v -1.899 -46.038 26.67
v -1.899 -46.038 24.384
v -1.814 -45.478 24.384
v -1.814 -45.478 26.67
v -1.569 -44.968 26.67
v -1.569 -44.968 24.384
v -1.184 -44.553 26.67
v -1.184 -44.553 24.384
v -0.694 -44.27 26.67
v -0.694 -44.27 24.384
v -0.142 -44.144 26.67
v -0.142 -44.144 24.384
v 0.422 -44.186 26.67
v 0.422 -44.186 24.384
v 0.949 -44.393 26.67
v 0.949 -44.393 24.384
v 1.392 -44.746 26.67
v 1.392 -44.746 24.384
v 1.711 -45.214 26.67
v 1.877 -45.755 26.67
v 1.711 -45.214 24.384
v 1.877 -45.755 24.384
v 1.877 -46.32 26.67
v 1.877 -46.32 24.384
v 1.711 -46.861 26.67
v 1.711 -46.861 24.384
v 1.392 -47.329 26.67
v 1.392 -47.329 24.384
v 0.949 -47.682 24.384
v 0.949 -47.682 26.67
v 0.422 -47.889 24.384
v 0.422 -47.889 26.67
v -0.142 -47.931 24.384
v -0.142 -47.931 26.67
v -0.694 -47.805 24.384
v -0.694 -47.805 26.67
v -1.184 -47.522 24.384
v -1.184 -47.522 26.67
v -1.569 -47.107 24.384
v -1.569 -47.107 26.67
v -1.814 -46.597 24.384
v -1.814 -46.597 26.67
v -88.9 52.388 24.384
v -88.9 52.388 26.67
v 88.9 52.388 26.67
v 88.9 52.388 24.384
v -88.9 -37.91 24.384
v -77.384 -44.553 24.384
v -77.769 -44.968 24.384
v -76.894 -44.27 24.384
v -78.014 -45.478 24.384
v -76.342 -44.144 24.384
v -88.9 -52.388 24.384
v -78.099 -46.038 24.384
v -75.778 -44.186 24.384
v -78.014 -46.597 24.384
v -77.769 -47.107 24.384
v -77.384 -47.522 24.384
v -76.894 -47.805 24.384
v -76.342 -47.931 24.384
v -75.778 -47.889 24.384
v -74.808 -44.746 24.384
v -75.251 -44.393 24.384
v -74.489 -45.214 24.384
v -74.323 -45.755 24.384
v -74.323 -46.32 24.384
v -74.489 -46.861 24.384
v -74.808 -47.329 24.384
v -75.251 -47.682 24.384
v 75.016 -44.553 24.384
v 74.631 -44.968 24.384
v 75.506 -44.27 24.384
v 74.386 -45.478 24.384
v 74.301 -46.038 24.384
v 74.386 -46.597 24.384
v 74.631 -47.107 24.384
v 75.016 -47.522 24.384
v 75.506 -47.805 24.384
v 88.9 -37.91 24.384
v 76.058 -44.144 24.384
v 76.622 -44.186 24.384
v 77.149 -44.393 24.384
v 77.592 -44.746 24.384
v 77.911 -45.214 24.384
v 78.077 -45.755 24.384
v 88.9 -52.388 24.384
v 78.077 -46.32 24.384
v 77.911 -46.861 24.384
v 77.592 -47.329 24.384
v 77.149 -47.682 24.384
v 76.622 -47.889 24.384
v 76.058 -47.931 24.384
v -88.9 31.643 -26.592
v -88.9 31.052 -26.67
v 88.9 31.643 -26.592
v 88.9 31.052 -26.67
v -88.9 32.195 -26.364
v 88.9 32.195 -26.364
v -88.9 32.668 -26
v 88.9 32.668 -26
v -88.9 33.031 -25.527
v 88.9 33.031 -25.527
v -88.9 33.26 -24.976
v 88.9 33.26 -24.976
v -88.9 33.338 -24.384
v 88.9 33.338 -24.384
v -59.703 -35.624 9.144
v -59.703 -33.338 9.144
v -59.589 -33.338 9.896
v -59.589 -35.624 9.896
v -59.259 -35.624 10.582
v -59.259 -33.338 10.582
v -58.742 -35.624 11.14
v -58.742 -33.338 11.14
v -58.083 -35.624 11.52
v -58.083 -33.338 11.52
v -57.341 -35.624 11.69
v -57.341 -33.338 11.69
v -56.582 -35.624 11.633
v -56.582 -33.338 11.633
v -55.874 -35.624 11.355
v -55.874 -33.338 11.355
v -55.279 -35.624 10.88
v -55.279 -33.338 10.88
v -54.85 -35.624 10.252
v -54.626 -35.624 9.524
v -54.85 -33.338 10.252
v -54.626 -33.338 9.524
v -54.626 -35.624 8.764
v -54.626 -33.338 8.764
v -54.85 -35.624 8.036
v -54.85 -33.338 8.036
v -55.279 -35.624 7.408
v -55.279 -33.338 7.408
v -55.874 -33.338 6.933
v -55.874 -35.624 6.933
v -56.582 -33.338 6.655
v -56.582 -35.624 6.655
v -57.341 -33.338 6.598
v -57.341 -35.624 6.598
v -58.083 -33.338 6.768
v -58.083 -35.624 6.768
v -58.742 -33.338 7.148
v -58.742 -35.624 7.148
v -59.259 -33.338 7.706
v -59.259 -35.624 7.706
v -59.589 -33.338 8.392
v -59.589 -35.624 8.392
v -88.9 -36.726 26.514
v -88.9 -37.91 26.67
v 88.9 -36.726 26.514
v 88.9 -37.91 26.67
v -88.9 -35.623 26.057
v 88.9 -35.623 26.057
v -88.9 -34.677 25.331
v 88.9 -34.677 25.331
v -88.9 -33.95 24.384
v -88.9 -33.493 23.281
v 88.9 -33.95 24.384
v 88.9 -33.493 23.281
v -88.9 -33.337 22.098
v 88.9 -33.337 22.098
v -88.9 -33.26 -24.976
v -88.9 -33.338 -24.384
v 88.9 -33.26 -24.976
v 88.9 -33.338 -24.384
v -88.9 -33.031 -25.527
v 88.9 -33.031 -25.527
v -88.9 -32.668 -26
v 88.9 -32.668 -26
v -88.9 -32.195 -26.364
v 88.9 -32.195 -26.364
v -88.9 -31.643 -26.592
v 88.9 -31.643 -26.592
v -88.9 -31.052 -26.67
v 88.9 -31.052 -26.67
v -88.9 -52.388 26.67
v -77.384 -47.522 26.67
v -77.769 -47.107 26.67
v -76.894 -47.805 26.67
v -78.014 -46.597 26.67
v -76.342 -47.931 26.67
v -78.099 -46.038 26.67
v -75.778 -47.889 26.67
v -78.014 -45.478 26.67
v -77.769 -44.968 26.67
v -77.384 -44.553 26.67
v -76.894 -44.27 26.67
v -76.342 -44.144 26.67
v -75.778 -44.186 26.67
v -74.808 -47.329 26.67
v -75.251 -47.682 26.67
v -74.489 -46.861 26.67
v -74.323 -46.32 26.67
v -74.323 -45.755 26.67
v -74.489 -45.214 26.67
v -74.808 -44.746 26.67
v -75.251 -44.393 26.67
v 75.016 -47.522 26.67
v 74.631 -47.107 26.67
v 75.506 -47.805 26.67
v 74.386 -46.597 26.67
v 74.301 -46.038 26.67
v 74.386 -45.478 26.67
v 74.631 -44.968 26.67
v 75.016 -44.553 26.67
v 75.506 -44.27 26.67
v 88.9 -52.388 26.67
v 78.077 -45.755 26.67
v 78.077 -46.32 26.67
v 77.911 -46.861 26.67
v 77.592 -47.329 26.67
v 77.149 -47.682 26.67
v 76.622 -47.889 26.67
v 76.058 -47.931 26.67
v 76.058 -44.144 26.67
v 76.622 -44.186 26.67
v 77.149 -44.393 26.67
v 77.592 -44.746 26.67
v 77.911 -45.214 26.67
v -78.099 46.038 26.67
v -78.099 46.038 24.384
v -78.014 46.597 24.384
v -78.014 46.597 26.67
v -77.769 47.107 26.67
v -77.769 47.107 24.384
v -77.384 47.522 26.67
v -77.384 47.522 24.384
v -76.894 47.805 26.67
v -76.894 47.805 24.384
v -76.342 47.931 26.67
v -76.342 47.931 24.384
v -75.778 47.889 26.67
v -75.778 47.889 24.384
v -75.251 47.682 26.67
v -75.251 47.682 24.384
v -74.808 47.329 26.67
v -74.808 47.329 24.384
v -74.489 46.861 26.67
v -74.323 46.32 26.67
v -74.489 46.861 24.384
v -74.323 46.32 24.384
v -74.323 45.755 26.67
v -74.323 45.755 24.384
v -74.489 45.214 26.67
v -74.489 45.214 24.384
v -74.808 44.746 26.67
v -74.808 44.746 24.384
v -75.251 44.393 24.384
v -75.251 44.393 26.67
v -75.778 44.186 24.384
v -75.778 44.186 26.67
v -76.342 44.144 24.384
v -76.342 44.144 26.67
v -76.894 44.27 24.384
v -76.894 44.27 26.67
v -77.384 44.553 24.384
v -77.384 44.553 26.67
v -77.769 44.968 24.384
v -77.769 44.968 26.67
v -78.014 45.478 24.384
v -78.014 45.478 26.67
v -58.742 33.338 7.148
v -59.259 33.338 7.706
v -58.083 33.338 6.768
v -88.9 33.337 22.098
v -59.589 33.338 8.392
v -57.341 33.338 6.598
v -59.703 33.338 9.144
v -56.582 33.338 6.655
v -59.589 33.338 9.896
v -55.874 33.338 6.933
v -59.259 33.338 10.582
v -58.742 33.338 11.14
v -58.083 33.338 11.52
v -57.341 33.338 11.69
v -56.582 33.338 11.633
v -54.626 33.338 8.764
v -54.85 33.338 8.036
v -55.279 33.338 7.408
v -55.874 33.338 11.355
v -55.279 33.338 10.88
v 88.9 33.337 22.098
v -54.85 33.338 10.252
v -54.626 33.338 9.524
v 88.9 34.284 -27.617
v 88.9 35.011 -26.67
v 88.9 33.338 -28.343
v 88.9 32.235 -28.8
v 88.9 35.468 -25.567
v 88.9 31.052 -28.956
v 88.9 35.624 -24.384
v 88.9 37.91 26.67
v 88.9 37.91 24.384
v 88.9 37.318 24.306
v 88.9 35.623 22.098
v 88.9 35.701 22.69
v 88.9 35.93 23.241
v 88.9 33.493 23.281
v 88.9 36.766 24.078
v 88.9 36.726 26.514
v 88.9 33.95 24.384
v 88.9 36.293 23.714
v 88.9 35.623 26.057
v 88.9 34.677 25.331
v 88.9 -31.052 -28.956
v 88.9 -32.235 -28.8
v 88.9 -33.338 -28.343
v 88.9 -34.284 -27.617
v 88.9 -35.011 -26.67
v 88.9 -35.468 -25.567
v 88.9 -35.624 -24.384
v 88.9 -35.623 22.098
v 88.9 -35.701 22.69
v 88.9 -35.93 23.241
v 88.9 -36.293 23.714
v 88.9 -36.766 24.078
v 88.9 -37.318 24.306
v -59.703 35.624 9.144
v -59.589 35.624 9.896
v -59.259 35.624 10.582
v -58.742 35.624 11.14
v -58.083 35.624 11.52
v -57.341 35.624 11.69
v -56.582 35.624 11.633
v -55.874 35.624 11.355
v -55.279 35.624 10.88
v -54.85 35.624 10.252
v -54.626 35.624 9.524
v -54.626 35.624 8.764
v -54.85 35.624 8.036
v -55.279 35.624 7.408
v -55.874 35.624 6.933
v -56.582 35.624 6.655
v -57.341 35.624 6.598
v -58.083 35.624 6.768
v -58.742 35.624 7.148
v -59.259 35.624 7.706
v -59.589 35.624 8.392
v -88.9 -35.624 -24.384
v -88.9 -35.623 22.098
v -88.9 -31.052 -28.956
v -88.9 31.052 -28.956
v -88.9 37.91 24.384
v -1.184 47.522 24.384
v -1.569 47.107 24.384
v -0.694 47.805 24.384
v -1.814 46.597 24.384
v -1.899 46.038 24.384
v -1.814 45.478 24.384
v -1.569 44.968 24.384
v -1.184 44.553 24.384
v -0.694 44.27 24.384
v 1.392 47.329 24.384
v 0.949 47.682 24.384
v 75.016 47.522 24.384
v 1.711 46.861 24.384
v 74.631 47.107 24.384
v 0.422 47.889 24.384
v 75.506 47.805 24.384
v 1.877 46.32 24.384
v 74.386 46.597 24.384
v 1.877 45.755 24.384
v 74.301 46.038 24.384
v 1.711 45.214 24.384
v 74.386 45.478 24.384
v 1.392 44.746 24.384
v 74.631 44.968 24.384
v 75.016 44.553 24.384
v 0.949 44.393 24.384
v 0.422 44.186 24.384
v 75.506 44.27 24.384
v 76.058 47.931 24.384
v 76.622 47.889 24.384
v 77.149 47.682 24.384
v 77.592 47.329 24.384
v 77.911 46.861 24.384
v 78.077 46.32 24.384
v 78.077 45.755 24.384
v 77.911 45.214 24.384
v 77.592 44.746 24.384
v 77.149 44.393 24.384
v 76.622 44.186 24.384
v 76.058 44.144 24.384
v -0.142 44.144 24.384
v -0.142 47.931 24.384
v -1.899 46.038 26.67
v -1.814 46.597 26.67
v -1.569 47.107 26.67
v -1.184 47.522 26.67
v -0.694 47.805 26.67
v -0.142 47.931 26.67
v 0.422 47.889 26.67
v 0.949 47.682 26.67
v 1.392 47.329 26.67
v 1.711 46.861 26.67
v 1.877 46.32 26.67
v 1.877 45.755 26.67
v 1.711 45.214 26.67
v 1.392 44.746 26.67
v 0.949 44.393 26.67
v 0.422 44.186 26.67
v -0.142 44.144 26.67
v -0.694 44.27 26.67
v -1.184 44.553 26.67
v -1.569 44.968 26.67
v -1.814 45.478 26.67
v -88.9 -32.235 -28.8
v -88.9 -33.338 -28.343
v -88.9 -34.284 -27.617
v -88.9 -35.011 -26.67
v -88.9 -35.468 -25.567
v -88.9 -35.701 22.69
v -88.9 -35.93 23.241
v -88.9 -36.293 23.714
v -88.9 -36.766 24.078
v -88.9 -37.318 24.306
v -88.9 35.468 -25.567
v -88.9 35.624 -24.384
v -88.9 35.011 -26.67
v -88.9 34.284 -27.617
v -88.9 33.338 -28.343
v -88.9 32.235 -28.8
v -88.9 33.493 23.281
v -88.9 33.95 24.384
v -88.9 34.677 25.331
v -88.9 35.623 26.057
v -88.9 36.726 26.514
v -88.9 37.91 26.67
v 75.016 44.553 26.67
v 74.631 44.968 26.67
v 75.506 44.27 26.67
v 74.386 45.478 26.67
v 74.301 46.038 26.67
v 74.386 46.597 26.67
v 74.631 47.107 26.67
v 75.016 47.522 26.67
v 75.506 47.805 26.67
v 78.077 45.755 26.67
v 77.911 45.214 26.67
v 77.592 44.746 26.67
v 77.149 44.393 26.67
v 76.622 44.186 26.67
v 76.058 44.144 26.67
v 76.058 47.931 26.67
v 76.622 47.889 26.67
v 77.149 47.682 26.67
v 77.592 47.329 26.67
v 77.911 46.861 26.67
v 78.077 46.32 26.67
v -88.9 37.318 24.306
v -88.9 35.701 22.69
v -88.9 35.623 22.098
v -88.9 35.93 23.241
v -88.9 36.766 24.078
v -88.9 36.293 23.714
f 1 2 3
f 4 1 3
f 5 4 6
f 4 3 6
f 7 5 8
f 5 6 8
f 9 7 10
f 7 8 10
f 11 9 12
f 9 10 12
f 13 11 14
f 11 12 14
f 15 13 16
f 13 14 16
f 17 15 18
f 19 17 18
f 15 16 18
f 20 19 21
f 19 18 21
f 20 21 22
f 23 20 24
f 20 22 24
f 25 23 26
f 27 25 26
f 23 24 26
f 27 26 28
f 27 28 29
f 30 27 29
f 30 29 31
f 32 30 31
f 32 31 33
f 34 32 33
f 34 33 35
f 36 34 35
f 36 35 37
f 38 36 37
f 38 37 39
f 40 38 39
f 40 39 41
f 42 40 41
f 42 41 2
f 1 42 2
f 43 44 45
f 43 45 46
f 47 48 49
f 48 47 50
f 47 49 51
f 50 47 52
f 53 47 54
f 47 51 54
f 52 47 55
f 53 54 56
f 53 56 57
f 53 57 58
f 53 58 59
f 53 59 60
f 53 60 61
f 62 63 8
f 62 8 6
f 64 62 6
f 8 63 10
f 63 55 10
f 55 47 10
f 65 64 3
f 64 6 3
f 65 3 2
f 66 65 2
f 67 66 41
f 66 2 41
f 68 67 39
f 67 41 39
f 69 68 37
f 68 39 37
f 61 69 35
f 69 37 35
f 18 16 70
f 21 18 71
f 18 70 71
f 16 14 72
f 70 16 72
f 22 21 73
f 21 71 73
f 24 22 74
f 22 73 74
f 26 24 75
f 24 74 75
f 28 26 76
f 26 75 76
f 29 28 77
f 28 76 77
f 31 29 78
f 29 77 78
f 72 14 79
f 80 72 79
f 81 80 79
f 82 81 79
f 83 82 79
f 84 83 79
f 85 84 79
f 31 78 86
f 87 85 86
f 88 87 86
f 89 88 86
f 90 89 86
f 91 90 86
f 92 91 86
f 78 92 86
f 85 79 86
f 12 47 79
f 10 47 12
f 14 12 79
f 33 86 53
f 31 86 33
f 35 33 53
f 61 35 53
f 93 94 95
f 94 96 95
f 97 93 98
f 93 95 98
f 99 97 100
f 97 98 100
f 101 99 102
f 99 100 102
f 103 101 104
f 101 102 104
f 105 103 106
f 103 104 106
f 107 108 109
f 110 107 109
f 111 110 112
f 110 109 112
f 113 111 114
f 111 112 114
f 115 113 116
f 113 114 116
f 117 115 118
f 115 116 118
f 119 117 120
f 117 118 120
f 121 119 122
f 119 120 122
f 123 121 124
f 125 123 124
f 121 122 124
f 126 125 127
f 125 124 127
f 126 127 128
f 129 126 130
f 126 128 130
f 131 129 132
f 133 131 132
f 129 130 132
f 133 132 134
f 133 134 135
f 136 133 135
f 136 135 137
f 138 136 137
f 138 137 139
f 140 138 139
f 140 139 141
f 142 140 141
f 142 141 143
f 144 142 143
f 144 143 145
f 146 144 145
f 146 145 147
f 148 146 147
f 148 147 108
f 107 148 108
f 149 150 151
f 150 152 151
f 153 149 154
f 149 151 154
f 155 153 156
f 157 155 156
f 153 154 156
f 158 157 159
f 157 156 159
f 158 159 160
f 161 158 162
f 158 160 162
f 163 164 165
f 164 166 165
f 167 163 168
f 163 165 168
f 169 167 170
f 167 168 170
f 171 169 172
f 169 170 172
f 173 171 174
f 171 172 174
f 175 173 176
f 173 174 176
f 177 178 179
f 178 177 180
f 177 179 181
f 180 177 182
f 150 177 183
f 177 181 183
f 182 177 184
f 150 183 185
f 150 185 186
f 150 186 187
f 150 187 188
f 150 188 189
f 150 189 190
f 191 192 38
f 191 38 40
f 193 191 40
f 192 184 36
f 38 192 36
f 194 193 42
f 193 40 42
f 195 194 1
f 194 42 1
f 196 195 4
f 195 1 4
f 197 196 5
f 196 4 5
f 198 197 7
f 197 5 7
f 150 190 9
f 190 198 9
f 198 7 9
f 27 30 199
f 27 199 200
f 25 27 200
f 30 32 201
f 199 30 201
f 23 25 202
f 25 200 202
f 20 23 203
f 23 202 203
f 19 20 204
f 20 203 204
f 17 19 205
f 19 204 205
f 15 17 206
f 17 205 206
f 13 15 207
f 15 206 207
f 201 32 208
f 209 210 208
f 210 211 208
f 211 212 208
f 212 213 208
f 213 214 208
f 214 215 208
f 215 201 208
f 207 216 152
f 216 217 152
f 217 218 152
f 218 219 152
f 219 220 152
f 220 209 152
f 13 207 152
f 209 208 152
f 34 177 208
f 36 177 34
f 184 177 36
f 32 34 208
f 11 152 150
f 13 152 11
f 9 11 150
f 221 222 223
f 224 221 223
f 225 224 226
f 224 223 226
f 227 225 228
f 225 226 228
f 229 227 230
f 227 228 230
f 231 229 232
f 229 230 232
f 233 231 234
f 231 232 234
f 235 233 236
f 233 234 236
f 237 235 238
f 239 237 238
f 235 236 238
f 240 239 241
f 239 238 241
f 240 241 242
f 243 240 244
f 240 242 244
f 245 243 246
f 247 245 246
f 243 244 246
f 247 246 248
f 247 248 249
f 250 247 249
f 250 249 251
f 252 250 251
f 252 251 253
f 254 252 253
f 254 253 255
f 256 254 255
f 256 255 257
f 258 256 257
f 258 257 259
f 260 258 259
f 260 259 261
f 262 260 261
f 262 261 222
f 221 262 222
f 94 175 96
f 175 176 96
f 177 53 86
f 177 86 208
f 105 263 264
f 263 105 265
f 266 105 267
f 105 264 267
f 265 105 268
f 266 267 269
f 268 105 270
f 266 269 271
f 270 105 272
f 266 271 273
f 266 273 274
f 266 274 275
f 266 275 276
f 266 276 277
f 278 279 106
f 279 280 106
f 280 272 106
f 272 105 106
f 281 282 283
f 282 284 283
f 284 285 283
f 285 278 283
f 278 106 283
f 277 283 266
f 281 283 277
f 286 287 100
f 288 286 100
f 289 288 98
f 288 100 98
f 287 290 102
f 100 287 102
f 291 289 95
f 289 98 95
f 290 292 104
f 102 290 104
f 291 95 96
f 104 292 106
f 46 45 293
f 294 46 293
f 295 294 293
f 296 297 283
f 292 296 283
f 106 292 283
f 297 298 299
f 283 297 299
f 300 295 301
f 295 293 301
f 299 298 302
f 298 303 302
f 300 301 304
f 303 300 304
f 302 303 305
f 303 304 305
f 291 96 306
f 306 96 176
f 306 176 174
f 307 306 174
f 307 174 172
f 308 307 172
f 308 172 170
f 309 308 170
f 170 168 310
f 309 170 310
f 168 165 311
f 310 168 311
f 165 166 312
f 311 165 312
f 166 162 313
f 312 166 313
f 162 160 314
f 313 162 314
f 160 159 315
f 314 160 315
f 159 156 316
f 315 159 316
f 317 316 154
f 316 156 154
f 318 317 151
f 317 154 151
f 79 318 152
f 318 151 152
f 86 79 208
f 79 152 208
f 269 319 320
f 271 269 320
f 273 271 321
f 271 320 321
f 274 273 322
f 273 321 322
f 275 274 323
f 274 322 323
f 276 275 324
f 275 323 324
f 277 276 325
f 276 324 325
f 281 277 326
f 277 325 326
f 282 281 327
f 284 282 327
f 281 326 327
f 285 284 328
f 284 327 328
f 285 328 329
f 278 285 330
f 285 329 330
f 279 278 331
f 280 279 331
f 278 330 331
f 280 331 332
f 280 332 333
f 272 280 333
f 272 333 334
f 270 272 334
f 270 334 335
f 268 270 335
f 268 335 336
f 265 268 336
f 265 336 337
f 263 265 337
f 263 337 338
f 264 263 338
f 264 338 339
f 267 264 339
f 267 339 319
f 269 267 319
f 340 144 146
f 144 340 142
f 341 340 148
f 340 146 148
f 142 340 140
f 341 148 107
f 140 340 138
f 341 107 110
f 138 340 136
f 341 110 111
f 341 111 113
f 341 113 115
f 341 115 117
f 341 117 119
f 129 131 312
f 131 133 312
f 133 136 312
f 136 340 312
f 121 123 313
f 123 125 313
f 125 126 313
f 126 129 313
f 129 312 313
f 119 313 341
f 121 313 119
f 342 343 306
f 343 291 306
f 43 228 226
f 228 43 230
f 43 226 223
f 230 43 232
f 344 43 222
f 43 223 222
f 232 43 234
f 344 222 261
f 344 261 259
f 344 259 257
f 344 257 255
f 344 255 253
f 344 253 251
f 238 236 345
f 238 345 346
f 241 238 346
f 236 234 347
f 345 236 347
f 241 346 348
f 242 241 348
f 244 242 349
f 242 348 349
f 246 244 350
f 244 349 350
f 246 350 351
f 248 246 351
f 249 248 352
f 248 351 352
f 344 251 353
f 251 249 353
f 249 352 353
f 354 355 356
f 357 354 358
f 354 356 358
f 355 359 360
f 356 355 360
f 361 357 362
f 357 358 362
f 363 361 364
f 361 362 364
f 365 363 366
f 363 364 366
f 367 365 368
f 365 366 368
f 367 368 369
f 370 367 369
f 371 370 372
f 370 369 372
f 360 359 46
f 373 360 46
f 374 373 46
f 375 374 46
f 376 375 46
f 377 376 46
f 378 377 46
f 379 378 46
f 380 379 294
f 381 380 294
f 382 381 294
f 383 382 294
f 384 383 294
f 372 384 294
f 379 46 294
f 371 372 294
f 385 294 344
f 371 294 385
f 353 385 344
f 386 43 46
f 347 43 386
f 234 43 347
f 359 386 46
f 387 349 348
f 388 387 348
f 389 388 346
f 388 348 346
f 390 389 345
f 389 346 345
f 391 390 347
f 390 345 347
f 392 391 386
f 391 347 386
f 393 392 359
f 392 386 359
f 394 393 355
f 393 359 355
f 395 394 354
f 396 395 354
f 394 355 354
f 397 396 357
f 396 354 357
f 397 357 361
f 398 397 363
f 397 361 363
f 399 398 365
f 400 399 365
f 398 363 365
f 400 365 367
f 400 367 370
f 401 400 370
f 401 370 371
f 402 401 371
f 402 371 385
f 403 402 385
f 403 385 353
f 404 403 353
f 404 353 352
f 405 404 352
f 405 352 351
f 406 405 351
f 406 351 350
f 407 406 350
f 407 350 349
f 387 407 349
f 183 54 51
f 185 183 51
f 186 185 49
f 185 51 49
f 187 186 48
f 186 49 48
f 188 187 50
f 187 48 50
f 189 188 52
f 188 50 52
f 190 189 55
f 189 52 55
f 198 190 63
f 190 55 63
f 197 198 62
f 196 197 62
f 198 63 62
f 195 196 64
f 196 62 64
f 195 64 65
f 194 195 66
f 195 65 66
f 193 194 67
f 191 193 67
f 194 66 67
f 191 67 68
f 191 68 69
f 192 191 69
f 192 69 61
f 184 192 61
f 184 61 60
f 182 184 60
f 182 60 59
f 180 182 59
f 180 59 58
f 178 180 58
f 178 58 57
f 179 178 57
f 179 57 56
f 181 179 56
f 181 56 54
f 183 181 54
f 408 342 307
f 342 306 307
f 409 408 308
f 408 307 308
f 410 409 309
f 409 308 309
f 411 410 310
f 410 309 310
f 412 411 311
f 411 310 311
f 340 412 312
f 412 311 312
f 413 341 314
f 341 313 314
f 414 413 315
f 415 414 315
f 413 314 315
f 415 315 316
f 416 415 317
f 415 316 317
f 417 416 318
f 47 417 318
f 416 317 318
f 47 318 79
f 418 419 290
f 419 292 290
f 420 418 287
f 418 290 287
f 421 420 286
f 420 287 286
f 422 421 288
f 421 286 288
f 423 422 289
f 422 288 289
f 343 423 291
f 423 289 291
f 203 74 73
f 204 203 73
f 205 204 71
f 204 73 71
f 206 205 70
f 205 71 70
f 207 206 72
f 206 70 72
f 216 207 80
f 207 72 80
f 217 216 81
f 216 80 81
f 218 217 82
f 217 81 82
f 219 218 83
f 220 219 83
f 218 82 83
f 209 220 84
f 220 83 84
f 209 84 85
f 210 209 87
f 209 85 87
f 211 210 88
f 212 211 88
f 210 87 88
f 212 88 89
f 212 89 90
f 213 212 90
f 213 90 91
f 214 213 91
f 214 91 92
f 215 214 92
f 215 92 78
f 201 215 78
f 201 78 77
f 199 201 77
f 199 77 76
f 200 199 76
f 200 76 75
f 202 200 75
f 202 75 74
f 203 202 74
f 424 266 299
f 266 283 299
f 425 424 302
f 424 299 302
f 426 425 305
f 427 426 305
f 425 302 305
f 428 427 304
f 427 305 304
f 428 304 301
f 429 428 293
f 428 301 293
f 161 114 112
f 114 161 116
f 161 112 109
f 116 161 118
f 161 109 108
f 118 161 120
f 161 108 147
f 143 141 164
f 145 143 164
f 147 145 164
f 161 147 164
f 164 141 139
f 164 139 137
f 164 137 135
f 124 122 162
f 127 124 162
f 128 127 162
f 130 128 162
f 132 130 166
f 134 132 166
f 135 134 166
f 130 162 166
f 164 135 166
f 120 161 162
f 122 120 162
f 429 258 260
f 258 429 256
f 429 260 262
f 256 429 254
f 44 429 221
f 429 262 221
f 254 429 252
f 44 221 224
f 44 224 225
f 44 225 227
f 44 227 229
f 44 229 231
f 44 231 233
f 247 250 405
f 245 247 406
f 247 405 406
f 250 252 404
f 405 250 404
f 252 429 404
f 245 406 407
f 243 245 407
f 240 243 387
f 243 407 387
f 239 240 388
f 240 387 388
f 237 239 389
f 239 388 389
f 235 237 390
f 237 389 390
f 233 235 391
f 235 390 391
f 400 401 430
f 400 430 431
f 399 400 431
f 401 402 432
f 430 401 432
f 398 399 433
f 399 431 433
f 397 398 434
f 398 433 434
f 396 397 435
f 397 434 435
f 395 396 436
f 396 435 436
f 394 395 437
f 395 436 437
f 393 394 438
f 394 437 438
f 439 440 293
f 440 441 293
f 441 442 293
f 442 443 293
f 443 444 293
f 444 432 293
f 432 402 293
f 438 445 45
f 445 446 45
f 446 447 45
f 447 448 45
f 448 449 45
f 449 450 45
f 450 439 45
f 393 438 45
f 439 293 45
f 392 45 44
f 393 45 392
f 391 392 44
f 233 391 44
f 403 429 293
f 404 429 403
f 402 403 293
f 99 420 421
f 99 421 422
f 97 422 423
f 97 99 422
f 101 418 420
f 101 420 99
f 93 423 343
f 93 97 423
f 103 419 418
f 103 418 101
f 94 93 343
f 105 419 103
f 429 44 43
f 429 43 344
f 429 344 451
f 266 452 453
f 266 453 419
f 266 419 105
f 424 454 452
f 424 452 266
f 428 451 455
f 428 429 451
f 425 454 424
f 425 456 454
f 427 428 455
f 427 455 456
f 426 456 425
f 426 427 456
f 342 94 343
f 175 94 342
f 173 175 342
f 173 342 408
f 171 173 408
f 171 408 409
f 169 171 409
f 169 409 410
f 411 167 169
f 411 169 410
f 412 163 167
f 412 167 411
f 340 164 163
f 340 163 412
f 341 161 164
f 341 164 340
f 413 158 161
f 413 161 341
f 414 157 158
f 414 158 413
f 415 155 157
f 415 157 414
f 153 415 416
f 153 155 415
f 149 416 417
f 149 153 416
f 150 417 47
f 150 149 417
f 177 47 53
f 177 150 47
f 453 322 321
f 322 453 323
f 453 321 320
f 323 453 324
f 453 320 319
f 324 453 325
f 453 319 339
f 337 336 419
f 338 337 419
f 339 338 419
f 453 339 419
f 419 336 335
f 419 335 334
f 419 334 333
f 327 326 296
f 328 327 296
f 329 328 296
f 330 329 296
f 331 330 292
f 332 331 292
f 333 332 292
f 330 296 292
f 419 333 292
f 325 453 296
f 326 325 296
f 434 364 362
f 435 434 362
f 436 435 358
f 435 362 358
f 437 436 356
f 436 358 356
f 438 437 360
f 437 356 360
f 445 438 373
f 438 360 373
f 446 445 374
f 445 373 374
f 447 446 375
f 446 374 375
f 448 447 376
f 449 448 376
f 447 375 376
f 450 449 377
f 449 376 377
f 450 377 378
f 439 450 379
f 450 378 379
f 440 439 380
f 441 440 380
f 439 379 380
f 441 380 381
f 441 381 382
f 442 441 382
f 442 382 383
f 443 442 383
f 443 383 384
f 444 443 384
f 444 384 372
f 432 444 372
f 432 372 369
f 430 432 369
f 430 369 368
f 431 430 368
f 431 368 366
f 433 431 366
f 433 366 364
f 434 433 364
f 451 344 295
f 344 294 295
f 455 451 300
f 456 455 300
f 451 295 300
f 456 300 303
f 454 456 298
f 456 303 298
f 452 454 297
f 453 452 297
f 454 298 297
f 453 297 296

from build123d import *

# Parameters (mm, degrees)
BASE_FLANGE1_DEPTH           = 88.9
F_25_0_1495_DIAMETER_HOLE1_D = 3.7973
F_7_0_201_DIAMETER_HOLE1_D   = 5.1054


# Sheet-metal steps are written as plain solids
with BuildPart() as part:
    # Sketch1 → Base-Flange1 (new, symmetric)
    with BuildSketch(Plane.YZ):
        with BuildLine():
            Line((-52.3875, 26.67), (-37.9095, 26.67))
            ThreePointArc((-37.9095, 26.67), (-34.676607796, 25.330892204), (-33.3375, 22.098))
            Line((-33.3375, 22.098), (-33.3375, -24.384))
            ThreePointArc((-33.3375, -24.384), (-32.667946102, -26.000446102), (-31.0515, -26.67))
            Line((-31.0515, -26.67), (31.0515, -26.67))
            ThreePointArc((31.0515, -26.67), (32.667946102, -26.000446102), (33.3375, -24.384))
            Line((33.3375, -24.384), (33.3375, 22.098))
            ThreePointArc((33.3375, 22.098), (34.676607796, 25.330892204), (37.9095, 26.67))
            Line((37.9095, 26.67), (52.3875, 26.67))
            Line((52.3875, 26.67), (52.3875, 24.384))
            Line((52.3875, 24.384), (37.9095, 24.384))
            ThreePointArc((37.9095, 24.384), (36.293053898, 23.714446102), (35.6235, 22.098))
            Line((35.6235, 22.098), (35.6235, -24.384))
            ThreePointArc((35.6235, -24.384), (34.284392204, -27.616892204), (31.0515, -28.956))
            Line((31.0515, -28.956), (-31.0515, -28.956))
            ThreePointArc((-31.0515, -28.956), (-34.284392204, -27.616892204), (-35.6235, -24.384))
            Line((-35.6235, -24.384), (-35.6235, 22.098))
            ThreePointArc((-35.6235, 22.098), (-36.293053898, 23.714446102), (-37.9095, 24.384))
            Line((-37.9095, 24.384), (-52.3875, 24.384))
            Line((-52.3875, 24.384), (-52.3875, 26.67))
        make_face()
    extrude(amount=BASE_FLANGE1_DEPTH, both=True)

    # #25 (0.1495) Diameter Hole1 (through all)
    with Locations(Plane.XY.offset(26.67)):
        with Locations((-76.2, 46.0375), (0, 46.0375), (76.2, 46.0375), (76.2, -46.0375), (0, -46.0375), (-76.2, -46.0375)):
            Hole(F_25_0_1495_DIAMETER_HOLE1_D / 2)

    # #7 (0.201) Diameter Hole1 (through all)
    with Locations(Plane.XZ.offset(35.6235)):
        with Locations((-57.15, 9.144)):
            Hole(F_7_0_201_DIAMETER_HOLE1_D / 2)


solid = part.part
